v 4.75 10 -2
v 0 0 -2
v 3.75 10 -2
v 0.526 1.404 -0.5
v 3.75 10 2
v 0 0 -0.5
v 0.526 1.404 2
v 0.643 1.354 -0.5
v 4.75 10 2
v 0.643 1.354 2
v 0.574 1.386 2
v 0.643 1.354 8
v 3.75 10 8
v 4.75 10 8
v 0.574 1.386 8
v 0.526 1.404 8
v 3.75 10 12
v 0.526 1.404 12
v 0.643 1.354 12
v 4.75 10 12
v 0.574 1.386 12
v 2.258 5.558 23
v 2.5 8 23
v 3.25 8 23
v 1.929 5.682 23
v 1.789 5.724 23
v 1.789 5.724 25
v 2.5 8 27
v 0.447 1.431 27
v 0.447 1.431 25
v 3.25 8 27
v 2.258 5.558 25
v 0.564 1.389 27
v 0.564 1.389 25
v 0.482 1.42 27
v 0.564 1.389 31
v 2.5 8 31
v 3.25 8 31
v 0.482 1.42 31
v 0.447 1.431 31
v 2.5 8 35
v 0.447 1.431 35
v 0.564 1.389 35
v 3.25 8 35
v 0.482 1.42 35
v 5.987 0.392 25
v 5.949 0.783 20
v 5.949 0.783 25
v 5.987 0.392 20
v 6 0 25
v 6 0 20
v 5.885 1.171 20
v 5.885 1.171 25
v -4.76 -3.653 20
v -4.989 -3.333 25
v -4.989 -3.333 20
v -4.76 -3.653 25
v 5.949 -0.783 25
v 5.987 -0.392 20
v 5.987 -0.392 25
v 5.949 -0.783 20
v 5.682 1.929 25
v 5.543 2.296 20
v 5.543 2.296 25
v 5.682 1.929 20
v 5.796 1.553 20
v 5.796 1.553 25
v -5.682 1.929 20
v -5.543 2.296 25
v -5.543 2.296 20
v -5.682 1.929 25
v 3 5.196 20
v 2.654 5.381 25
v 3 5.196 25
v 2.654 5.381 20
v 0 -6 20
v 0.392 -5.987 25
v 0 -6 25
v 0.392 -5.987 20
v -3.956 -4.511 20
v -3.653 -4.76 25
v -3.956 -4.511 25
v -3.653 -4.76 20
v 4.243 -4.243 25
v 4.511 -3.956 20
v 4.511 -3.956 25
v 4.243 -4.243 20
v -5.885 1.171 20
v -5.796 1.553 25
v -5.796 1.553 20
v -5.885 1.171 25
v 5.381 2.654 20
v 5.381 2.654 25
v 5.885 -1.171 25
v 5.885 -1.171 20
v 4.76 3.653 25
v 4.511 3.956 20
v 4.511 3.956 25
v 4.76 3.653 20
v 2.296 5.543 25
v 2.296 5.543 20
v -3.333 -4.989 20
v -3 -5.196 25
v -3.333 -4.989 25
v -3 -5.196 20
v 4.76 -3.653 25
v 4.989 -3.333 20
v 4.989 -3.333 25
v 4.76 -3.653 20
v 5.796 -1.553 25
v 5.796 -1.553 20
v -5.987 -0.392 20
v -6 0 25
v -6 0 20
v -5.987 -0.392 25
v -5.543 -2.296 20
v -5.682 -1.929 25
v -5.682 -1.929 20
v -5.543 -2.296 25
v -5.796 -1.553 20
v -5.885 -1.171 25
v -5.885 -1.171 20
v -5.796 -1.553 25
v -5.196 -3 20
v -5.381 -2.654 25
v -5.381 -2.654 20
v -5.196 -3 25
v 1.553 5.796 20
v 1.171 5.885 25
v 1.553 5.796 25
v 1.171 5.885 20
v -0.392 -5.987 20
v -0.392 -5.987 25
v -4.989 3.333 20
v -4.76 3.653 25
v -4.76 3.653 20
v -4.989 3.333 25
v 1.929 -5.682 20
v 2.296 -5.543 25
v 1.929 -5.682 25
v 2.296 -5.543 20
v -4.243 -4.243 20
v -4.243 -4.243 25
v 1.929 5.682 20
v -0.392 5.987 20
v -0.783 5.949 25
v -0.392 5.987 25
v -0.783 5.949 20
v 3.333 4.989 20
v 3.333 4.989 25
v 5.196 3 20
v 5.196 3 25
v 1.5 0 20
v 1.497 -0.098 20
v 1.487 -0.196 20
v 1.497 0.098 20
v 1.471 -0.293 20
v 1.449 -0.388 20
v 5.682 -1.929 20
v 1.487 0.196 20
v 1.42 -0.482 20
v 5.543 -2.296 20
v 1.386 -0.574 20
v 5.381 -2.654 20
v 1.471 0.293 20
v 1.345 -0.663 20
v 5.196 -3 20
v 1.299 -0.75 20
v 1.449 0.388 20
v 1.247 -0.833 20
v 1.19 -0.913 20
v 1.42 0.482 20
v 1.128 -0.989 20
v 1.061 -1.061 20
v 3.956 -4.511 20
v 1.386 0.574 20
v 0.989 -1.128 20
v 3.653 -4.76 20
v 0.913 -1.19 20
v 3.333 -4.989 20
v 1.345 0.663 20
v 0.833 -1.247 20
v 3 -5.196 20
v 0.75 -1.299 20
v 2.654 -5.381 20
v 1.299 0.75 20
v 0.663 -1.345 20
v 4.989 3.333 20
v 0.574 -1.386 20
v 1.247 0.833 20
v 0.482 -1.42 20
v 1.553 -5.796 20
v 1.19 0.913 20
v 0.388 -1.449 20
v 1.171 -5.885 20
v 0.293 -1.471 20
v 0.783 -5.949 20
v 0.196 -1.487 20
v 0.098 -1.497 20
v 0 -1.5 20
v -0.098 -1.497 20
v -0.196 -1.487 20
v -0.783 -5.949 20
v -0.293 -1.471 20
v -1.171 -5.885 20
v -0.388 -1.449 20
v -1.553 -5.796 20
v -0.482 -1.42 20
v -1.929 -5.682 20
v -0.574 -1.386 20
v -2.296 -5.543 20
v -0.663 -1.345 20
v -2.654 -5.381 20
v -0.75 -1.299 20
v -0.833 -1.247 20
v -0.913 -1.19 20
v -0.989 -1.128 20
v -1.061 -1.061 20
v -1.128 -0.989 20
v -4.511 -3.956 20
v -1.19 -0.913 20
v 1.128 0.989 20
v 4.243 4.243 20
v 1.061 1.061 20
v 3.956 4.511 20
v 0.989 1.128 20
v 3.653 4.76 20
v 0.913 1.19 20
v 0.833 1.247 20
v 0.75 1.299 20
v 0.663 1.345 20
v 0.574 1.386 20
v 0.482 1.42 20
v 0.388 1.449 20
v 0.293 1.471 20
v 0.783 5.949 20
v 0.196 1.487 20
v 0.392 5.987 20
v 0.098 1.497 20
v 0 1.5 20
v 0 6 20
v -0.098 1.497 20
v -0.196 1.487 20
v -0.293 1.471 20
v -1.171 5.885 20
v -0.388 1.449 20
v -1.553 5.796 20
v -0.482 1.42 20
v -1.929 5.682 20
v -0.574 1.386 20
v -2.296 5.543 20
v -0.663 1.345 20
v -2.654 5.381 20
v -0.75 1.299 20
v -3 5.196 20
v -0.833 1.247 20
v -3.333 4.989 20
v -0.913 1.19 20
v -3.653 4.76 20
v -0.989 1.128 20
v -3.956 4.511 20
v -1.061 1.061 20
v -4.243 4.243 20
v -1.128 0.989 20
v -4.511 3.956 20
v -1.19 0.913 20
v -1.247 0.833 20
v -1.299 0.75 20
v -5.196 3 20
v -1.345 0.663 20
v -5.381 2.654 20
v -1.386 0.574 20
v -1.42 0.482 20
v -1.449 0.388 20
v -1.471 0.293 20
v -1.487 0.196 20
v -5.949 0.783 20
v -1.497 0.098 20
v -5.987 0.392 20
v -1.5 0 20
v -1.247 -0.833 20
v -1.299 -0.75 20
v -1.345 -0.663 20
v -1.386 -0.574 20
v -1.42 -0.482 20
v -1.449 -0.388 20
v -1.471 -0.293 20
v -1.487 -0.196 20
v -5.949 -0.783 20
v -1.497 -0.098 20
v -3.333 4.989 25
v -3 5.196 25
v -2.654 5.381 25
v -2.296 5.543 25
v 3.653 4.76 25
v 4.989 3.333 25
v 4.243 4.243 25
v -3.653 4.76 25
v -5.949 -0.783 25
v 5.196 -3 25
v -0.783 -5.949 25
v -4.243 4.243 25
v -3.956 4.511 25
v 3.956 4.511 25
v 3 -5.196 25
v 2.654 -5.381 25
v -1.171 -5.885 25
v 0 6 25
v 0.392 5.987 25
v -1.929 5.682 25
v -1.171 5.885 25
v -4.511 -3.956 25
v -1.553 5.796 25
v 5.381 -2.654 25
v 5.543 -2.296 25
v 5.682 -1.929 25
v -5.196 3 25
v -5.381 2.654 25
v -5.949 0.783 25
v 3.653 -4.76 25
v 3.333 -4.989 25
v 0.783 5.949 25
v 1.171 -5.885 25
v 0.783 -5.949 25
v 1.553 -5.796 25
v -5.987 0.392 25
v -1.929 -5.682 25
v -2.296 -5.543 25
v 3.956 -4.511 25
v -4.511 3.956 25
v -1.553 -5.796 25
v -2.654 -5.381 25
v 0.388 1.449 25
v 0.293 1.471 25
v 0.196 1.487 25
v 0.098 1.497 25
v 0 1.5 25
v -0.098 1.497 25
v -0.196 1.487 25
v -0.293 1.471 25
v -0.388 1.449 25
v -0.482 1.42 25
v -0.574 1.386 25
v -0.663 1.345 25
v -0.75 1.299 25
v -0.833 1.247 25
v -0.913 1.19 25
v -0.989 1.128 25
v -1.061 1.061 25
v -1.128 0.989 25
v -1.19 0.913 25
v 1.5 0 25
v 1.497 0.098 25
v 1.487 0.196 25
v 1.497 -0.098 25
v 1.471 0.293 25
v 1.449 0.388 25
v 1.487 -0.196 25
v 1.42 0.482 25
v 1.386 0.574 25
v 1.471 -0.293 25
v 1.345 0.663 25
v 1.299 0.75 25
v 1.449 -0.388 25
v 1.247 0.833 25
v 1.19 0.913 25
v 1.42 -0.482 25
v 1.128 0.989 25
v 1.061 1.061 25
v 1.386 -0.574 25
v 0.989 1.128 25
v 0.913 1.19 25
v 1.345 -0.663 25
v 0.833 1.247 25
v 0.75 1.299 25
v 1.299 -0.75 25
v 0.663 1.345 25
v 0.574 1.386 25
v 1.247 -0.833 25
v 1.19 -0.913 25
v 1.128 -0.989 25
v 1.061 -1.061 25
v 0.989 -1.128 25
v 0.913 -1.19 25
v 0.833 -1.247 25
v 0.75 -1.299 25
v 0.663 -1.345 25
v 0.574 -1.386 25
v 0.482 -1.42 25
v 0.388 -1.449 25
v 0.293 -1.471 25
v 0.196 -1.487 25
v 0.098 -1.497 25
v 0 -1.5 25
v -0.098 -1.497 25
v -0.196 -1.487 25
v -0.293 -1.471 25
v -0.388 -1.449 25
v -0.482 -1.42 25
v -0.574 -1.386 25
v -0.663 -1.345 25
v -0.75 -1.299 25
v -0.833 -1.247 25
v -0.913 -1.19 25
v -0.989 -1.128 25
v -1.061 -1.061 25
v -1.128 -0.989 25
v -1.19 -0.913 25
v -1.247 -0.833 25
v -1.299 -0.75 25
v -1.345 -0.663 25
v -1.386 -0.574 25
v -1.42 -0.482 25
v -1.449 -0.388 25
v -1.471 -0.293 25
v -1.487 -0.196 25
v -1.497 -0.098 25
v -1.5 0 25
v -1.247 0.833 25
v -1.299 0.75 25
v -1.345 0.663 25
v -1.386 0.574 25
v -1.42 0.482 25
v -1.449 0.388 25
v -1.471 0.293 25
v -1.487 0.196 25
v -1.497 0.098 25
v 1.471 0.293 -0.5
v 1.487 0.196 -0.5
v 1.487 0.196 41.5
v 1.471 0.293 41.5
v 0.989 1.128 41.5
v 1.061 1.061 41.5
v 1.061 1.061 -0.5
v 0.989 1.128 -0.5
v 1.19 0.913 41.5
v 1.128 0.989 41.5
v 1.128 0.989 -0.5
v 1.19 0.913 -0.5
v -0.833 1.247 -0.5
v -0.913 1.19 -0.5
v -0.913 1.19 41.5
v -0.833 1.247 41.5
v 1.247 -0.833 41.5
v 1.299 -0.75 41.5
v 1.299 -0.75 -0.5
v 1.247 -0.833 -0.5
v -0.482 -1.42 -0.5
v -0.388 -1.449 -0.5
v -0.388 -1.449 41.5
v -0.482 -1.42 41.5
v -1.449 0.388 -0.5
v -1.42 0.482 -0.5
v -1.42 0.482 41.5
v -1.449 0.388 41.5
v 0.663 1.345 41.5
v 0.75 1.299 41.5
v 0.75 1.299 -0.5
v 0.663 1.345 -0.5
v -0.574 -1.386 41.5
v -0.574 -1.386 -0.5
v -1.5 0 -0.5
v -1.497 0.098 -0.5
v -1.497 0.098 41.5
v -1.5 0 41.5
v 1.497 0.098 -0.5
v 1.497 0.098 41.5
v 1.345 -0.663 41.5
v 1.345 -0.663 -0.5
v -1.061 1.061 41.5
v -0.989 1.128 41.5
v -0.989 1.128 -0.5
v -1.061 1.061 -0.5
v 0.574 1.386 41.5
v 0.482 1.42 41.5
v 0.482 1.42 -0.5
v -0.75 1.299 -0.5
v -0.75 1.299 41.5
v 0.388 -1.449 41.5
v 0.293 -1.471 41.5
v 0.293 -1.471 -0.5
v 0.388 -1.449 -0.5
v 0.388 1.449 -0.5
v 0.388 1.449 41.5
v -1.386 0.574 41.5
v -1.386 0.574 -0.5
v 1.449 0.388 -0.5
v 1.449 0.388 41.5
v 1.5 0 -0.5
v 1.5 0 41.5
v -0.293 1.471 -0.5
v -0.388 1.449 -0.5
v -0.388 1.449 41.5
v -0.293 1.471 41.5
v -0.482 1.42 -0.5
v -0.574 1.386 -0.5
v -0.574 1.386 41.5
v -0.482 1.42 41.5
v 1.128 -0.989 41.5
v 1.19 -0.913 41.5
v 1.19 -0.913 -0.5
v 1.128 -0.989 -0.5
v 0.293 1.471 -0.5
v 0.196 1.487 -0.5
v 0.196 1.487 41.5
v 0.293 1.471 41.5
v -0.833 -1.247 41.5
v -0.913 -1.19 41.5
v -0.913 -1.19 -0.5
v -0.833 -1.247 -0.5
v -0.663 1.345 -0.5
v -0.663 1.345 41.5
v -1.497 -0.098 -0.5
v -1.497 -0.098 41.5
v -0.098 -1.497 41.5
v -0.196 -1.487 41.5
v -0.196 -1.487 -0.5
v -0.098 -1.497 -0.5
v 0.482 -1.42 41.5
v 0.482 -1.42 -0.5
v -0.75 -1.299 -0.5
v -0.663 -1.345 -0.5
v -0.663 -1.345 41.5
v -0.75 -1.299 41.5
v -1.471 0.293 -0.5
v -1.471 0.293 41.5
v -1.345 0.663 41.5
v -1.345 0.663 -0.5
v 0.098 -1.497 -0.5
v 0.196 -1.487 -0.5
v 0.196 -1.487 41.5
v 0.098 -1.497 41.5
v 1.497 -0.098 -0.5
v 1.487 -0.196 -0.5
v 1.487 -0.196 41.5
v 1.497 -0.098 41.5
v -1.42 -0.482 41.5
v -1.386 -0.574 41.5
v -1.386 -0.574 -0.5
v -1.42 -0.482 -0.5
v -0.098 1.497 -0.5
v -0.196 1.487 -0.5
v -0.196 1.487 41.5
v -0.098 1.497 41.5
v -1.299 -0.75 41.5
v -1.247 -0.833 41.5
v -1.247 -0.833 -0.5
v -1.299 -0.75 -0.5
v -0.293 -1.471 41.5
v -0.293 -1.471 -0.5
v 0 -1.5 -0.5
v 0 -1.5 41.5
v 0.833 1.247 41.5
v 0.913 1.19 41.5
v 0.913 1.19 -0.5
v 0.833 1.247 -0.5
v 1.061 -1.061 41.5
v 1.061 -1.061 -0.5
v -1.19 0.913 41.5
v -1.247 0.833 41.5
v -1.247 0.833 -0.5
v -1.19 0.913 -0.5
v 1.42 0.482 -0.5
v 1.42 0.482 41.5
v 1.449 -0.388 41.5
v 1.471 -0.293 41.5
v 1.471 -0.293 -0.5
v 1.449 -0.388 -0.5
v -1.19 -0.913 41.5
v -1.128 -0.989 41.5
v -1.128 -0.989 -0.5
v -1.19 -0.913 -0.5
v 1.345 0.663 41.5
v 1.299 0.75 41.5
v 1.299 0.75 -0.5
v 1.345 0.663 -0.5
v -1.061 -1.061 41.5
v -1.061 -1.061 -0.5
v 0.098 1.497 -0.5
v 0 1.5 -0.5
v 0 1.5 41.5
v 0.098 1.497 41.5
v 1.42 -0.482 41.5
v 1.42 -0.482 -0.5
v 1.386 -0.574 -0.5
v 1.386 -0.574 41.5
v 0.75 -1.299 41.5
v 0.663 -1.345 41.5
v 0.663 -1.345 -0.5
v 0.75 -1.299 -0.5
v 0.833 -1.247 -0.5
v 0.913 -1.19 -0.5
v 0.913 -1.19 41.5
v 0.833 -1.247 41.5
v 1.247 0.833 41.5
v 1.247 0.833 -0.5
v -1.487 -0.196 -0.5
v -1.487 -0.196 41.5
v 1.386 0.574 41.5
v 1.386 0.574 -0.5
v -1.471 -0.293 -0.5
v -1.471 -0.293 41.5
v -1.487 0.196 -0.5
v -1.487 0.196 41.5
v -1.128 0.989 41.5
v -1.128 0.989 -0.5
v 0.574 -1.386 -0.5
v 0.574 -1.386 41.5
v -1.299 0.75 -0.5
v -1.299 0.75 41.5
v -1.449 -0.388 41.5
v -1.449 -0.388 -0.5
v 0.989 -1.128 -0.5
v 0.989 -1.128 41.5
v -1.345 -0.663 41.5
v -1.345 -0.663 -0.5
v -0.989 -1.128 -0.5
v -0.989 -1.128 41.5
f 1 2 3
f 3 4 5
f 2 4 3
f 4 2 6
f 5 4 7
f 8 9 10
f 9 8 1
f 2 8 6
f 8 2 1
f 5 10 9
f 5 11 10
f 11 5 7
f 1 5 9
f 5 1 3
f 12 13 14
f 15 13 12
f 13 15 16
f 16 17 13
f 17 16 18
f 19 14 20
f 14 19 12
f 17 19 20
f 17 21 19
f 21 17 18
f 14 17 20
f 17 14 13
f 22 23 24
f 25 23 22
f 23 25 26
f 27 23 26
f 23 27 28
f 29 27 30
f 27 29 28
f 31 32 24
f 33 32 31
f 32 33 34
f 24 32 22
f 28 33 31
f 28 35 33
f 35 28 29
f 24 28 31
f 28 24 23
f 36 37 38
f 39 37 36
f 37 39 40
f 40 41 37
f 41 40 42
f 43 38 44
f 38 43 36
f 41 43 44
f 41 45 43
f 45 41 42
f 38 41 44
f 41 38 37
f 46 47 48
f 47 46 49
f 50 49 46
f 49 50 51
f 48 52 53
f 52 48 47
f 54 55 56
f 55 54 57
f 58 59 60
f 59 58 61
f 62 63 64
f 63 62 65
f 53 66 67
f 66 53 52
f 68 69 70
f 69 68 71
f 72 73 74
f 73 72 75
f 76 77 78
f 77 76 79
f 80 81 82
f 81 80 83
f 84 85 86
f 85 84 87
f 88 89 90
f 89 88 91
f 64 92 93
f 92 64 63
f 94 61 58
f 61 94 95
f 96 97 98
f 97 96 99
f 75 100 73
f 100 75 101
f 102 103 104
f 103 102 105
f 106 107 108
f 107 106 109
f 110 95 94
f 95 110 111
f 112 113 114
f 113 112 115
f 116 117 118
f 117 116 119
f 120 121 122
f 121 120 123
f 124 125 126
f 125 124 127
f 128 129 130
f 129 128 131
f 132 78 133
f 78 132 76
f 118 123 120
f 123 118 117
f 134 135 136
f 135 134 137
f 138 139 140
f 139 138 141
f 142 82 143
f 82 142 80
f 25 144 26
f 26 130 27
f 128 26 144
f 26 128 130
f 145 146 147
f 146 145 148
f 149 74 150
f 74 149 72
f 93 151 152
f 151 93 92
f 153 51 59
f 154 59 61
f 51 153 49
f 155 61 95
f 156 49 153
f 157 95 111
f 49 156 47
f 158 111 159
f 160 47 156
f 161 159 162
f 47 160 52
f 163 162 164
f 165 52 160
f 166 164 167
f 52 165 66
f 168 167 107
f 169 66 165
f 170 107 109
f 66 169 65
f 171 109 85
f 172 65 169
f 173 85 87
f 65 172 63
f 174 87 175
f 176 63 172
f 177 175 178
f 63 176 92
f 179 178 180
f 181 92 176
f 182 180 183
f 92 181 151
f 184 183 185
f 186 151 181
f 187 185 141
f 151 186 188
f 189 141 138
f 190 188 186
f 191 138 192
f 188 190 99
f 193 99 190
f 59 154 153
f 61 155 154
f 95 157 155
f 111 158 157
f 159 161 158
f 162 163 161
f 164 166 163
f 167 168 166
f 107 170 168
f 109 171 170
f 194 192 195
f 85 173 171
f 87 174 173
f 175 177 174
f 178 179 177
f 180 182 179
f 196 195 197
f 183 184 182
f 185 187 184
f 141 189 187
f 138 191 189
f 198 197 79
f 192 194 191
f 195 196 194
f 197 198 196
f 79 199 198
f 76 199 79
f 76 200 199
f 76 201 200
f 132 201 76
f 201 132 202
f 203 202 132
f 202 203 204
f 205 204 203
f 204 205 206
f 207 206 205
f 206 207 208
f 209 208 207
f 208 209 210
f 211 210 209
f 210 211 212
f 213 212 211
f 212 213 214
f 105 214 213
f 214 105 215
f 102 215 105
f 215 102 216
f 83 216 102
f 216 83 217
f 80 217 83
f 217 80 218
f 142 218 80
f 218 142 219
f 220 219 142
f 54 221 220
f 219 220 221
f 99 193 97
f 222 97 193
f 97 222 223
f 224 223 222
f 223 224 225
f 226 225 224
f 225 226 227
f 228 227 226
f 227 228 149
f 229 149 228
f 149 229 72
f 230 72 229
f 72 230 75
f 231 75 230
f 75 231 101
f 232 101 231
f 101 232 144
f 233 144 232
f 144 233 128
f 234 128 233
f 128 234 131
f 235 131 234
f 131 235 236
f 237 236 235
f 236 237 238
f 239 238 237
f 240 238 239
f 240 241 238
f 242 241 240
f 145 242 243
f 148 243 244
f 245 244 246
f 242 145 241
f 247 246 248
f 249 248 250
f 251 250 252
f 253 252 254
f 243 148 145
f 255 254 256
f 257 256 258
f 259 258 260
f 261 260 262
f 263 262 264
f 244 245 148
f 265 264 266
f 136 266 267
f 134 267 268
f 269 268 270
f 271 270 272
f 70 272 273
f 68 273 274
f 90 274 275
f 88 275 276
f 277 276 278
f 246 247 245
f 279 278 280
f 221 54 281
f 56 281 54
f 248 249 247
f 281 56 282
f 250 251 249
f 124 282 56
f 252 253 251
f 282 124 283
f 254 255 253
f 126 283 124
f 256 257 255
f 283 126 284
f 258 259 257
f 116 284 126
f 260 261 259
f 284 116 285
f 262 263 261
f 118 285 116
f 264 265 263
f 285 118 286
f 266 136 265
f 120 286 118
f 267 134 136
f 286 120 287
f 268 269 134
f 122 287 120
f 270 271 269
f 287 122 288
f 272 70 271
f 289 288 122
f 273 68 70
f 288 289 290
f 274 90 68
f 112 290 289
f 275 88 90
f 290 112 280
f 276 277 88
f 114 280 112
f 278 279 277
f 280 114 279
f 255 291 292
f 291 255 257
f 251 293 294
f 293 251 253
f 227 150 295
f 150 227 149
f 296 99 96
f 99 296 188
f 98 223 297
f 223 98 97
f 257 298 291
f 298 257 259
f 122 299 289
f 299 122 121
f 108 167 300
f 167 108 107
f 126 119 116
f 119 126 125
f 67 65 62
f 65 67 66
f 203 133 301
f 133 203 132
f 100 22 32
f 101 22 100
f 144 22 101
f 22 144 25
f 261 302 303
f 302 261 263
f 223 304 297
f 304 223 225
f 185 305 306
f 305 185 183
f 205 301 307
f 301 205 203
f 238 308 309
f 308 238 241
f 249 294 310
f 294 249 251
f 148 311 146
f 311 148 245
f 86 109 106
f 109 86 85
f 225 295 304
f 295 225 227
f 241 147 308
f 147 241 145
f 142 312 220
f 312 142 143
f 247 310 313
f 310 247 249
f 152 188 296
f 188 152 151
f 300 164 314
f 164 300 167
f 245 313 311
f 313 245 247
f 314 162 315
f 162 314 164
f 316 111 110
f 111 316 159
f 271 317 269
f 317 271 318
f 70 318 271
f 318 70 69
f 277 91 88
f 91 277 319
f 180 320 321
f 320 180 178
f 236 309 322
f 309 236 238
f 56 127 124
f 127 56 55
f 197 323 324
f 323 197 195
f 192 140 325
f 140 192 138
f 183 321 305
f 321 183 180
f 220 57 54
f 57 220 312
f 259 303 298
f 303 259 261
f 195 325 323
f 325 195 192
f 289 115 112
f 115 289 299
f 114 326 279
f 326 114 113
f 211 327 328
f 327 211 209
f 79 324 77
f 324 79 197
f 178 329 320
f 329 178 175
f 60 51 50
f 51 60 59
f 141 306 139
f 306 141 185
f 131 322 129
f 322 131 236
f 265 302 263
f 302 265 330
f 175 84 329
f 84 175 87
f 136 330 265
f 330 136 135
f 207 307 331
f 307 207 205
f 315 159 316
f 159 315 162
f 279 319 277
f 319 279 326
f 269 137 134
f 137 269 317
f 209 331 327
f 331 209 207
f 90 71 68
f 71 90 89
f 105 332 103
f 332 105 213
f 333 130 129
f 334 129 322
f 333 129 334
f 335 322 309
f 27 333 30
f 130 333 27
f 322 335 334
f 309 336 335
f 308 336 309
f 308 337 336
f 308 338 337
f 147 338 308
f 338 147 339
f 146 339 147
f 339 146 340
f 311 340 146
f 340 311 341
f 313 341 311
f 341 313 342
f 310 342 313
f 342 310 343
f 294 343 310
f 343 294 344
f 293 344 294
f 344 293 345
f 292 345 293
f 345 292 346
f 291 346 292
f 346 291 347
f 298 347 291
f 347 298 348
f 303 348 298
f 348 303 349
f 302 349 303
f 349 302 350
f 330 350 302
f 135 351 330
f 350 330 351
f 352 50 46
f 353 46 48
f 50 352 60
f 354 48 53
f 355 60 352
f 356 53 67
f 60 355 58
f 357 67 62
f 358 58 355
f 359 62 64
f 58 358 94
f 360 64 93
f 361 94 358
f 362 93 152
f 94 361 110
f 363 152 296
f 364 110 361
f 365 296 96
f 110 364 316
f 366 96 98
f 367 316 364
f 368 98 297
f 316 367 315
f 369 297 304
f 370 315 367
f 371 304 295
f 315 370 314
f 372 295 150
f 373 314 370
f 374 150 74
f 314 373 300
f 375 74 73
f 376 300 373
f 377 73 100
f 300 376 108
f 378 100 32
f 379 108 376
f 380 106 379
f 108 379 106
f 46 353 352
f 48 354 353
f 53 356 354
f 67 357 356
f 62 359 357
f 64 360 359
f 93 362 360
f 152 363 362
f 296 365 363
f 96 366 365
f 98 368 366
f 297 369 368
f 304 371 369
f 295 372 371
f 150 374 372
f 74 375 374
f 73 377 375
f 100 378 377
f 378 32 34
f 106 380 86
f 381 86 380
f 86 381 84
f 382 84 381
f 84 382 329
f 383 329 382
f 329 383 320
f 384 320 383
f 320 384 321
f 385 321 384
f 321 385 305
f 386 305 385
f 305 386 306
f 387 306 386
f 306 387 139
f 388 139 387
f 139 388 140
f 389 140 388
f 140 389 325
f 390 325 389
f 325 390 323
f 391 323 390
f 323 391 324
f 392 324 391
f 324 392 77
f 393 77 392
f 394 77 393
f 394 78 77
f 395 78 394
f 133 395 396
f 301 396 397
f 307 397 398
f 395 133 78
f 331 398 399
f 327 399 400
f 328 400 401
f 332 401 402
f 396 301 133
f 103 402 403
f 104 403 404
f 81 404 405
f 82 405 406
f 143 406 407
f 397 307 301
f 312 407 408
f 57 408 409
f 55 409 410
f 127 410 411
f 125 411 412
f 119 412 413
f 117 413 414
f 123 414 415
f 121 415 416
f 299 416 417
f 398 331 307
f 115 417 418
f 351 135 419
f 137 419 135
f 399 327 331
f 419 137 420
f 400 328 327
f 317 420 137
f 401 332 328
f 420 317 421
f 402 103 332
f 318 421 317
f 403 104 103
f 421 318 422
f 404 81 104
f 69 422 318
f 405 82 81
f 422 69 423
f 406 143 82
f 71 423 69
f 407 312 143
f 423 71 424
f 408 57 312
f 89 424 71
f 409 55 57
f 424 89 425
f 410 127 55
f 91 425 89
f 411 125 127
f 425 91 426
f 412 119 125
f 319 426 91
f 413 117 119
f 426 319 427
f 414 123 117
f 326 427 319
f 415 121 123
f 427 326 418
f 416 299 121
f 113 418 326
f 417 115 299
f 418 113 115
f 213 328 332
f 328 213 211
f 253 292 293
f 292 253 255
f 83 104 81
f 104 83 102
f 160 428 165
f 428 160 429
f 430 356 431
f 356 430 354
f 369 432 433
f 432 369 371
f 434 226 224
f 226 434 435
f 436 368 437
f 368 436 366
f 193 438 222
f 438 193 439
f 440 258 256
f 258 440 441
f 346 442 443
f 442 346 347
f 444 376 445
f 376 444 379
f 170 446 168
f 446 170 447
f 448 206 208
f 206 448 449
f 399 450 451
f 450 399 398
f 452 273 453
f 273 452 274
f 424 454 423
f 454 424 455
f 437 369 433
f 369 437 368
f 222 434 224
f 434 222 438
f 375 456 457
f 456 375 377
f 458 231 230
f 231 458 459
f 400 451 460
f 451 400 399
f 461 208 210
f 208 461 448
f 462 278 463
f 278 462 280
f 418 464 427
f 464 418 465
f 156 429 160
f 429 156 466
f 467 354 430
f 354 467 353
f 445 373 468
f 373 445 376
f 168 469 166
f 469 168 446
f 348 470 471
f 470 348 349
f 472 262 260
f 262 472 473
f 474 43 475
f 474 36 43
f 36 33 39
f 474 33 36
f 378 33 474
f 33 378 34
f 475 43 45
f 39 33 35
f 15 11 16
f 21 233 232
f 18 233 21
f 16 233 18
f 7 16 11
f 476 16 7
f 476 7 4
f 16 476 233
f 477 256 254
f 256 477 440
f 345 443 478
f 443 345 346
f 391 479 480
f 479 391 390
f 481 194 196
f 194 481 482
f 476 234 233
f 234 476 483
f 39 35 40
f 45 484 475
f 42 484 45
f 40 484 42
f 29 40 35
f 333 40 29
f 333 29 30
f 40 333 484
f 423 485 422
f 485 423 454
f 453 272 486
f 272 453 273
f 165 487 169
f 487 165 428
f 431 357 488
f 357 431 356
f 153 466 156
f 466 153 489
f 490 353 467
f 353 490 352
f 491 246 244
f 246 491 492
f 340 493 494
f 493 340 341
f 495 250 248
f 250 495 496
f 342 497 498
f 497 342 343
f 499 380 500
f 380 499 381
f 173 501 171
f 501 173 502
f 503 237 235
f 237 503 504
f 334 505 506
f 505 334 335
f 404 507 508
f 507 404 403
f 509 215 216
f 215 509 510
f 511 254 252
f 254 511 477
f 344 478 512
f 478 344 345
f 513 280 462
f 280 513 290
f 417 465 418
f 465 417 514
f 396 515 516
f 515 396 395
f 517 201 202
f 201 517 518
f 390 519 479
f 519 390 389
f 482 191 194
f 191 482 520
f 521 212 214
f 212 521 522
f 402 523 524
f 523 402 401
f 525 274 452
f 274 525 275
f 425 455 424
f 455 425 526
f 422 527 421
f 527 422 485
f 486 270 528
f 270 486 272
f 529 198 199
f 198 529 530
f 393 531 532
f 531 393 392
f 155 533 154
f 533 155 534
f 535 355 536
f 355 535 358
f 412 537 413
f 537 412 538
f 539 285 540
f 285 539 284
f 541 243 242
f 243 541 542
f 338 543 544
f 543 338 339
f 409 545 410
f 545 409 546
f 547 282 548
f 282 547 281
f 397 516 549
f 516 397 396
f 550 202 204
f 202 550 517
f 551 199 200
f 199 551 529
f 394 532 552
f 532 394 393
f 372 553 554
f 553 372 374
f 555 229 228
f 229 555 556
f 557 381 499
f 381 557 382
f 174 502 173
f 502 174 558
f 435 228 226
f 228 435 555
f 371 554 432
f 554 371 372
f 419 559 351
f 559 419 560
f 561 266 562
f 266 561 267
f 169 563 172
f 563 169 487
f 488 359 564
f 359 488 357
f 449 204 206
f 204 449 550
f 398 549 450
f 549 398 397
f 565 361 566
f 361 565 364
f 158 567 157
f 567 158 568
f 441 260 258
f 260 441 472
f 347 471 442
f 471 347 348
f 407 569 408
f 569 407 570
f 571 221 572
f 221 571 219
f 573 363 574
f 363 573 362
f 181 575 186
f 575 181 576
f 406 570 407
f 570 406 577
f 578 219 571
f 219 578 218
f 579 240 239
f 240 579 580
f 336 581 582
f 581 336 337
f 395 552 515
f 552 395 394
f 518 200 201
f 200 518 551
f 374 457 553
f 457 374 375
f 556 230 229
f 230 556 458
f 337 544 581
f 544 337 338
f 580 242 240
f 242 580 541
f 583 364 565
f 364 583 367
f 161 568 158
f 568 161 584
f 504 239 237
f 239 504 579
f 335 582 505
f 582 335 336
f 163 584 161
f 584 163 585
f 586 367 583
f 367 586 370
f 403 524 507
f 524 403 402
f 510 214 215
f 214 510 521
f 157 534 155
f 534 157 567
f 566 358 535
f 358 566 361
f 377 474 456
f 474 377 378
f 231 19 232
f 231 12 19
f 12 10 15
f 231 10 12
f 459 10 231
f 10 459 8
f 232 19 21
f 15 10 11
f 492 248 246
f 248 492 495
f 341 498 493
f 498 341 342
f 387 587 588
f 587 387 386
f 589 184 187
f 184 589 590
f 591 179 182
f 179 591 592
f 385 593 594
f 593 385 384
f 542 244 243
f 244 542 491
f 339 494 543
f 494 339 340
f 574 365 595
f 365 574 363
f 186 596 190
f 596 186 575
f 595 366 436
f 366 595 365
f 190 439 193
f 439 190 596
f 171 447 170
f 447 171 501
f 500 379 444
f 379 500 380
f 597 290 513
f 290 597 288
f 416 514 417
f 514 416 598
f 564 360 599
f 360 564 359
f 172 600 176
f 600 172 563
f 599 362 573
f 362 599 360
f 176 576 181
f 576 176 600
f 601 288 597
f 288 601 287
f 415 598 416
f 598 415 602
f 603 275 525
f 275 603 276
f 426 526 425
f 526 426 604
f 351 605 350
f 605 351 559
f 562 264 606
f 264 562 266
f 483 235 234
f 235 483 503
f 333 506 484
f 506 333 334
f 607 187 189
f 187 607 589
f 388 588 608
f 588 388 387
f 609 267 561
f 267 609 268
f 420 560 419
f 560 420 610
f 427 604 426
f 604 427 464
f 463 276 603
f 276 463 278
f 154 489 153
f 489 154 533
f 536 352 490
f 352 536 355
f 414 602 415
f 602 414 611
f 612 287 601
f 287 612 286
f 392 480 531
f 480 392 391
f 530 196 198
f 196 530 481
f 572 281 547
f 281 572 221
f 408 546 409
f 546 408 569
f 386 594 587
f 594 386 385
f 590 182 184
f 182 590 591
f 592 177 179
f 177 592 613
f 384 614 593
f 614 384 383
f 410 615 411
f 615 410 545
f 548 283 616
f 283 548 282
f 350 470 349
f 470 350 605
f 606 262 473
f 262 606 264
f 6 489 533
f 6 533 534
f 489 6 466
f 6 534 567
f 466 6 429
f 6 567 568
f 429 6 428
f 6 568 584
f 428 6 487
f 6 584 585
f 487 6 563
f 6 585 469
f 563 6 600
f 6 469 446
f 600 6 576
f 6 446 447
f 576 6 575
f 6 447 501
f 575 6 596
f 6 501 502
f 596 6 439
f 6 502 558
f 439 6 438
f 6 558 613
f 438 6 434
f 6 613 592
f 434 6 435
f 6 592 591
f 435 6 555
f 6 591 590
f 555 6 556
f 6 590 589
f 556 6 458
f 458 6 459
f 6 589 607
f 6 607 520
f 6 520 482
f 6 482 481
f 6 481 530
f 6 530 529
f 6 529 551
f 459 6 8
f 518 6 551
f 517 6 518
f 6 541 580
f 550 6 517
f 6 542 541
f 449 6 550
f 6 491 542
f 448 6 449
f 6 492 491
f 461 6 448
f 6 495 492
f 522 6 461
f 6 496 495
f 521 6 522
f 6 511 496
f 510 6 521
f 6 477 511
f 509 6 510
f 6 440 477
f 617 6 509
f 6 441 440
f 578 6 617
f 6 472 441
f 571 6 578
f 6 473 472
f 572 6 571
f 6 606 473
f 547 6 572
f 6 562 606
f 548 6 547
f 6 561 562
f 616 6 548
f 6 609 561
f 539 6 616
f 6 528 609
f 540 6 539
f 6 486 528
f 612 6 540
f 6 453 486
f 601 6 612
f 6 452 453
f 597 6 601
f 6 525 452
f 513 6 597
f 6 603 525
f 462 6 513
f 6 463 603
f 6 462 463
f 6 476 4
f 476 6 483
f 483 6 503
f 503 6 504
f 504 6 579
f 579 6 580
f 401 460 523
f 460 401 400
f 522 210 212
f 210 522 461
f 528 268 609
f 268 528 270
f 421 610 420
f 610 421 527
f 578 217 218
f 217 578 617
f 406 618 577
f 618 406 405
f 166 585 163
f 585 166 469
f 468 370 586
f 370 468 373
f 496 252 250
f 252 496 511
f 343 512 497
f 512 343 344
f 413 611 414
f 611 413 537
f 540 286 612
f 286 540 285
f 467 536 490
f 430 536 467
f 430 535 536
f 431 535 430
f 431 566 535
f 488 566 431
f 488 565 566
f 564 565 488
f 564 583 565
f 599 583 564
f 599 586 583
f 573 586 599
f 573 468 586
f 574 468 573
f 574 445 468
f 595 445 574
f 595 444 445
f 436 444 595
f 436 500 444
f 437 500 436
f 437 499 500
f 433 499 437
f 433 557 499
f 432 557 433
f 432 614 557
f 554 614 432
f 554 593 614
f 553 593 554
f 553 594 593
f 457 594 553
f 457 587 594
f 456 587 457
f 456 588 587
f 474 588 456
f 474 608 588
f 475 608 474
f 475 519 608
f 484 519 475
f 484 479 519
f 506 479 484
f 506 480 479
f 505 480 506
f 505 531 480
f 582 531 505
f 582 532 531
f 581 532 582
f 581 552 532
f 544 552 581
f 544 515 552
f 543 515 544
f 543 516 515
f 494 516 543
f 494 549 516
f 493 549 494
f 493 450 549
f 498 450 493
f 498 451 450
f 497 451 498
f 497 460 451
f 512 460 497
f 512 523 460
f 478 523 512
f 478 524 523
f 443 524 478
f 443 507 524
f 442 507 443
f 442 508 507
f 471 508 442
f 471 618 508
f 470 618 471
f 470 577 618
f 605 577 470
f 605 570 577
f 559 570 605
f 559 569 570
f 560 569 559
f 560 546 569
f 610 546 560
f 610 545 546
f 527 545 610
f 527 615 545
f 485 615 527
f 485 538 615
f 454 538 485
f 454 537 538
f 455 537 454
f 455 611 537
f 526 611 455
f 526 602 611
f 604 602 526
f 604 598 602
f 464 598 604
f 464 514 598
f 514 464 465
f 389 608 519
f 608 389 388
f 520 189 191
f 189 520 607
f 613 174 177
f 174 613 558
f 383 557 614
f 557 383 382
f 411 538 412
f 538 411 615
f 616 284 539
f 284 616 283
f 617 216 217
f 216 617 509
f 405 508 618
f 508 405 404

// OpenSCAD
// Straight hose-barb reducer: 8 mm ID tubing to 5 mm ID tubing
// Print orientation: standing upright along Z axis

$fn = 96;

// ---- Dimensions (mm) ----
barb8_od_bottom = 7.5;   // 8 mm tubing barb: OD at bottom
barb8_od_top    = 9.5;   // 8 mm tubing barb: OD at top
barb8_h         = 10;    // 8 mm tubing barb: height
barb8_count     = 2;     // 8 mm tubing barb: number, stacked

collar_d        = 12;    // cylindrical collar: diameter
collar_h        = 5;     // cylindrical collar: height (z = 20 to 25)

barb5_od_bottom = 6.5;   // 5 mm tubing barb: OD at bottom
barb5_od_top    = 5.0;   // 5 mm tubing barb: OD at top
barb5_h         = 8;     // 5 mm tubing barb: height
barb5_count     = 2;     // 5 mm tubing barb: number, stacked

bore_d          = 3;     // through-bore diameter
eps             = 0.5;   // cutter overshoot past faces

z0              = 0;     // start of 8 mm barbs
z20             = 20;    // start of collar
z25             = 25;    // start of 5 mm barbs
z41             = 41;    // end of 5 mm barbs

// ---- Model ----
union() {
    // 8 mm tubing barbs: sawtooth profile, stacked, z = 0 to 20
    for (i = [0 : barb8_count - 1]) {
        translate([0, 0, i * barb8_h])
            linear_extrude(height = bore_d + 2 * eps, center = true)
                polygon([
                    [0, 0],
                    [barb8_od_bottom / 2, barb8_h],
                    [barb8_od_top / 2, barb8_h]
                ]);
    }

    // Cylindrical collar, z = 20 to 25
    translate([0, 0, z20])
        cylinder(d = collar_d, h = collar_h);

    // 5 mm tubing barbs: shrinking OD, stacked, z = 25 to 41
    for (i = [0 : barb5_count - 1]) {
        translate([0, 0, z25 + i * barb5_h])
            linear_extrude(height = bore_d + 2 * eps, center = true)
                polygon([
                    [0, 0],
                    [barb5_od_bottom / 2, barb5_h],
                    [barb5_od_top / 2, barb5_h]
                ]);
    }
}

// Through-bore, full length
difference() {
    // (current part)
    translate([0, 0, -eps])
        cylinder(d = bore_d, h = z41 + 2 * eps);
}
